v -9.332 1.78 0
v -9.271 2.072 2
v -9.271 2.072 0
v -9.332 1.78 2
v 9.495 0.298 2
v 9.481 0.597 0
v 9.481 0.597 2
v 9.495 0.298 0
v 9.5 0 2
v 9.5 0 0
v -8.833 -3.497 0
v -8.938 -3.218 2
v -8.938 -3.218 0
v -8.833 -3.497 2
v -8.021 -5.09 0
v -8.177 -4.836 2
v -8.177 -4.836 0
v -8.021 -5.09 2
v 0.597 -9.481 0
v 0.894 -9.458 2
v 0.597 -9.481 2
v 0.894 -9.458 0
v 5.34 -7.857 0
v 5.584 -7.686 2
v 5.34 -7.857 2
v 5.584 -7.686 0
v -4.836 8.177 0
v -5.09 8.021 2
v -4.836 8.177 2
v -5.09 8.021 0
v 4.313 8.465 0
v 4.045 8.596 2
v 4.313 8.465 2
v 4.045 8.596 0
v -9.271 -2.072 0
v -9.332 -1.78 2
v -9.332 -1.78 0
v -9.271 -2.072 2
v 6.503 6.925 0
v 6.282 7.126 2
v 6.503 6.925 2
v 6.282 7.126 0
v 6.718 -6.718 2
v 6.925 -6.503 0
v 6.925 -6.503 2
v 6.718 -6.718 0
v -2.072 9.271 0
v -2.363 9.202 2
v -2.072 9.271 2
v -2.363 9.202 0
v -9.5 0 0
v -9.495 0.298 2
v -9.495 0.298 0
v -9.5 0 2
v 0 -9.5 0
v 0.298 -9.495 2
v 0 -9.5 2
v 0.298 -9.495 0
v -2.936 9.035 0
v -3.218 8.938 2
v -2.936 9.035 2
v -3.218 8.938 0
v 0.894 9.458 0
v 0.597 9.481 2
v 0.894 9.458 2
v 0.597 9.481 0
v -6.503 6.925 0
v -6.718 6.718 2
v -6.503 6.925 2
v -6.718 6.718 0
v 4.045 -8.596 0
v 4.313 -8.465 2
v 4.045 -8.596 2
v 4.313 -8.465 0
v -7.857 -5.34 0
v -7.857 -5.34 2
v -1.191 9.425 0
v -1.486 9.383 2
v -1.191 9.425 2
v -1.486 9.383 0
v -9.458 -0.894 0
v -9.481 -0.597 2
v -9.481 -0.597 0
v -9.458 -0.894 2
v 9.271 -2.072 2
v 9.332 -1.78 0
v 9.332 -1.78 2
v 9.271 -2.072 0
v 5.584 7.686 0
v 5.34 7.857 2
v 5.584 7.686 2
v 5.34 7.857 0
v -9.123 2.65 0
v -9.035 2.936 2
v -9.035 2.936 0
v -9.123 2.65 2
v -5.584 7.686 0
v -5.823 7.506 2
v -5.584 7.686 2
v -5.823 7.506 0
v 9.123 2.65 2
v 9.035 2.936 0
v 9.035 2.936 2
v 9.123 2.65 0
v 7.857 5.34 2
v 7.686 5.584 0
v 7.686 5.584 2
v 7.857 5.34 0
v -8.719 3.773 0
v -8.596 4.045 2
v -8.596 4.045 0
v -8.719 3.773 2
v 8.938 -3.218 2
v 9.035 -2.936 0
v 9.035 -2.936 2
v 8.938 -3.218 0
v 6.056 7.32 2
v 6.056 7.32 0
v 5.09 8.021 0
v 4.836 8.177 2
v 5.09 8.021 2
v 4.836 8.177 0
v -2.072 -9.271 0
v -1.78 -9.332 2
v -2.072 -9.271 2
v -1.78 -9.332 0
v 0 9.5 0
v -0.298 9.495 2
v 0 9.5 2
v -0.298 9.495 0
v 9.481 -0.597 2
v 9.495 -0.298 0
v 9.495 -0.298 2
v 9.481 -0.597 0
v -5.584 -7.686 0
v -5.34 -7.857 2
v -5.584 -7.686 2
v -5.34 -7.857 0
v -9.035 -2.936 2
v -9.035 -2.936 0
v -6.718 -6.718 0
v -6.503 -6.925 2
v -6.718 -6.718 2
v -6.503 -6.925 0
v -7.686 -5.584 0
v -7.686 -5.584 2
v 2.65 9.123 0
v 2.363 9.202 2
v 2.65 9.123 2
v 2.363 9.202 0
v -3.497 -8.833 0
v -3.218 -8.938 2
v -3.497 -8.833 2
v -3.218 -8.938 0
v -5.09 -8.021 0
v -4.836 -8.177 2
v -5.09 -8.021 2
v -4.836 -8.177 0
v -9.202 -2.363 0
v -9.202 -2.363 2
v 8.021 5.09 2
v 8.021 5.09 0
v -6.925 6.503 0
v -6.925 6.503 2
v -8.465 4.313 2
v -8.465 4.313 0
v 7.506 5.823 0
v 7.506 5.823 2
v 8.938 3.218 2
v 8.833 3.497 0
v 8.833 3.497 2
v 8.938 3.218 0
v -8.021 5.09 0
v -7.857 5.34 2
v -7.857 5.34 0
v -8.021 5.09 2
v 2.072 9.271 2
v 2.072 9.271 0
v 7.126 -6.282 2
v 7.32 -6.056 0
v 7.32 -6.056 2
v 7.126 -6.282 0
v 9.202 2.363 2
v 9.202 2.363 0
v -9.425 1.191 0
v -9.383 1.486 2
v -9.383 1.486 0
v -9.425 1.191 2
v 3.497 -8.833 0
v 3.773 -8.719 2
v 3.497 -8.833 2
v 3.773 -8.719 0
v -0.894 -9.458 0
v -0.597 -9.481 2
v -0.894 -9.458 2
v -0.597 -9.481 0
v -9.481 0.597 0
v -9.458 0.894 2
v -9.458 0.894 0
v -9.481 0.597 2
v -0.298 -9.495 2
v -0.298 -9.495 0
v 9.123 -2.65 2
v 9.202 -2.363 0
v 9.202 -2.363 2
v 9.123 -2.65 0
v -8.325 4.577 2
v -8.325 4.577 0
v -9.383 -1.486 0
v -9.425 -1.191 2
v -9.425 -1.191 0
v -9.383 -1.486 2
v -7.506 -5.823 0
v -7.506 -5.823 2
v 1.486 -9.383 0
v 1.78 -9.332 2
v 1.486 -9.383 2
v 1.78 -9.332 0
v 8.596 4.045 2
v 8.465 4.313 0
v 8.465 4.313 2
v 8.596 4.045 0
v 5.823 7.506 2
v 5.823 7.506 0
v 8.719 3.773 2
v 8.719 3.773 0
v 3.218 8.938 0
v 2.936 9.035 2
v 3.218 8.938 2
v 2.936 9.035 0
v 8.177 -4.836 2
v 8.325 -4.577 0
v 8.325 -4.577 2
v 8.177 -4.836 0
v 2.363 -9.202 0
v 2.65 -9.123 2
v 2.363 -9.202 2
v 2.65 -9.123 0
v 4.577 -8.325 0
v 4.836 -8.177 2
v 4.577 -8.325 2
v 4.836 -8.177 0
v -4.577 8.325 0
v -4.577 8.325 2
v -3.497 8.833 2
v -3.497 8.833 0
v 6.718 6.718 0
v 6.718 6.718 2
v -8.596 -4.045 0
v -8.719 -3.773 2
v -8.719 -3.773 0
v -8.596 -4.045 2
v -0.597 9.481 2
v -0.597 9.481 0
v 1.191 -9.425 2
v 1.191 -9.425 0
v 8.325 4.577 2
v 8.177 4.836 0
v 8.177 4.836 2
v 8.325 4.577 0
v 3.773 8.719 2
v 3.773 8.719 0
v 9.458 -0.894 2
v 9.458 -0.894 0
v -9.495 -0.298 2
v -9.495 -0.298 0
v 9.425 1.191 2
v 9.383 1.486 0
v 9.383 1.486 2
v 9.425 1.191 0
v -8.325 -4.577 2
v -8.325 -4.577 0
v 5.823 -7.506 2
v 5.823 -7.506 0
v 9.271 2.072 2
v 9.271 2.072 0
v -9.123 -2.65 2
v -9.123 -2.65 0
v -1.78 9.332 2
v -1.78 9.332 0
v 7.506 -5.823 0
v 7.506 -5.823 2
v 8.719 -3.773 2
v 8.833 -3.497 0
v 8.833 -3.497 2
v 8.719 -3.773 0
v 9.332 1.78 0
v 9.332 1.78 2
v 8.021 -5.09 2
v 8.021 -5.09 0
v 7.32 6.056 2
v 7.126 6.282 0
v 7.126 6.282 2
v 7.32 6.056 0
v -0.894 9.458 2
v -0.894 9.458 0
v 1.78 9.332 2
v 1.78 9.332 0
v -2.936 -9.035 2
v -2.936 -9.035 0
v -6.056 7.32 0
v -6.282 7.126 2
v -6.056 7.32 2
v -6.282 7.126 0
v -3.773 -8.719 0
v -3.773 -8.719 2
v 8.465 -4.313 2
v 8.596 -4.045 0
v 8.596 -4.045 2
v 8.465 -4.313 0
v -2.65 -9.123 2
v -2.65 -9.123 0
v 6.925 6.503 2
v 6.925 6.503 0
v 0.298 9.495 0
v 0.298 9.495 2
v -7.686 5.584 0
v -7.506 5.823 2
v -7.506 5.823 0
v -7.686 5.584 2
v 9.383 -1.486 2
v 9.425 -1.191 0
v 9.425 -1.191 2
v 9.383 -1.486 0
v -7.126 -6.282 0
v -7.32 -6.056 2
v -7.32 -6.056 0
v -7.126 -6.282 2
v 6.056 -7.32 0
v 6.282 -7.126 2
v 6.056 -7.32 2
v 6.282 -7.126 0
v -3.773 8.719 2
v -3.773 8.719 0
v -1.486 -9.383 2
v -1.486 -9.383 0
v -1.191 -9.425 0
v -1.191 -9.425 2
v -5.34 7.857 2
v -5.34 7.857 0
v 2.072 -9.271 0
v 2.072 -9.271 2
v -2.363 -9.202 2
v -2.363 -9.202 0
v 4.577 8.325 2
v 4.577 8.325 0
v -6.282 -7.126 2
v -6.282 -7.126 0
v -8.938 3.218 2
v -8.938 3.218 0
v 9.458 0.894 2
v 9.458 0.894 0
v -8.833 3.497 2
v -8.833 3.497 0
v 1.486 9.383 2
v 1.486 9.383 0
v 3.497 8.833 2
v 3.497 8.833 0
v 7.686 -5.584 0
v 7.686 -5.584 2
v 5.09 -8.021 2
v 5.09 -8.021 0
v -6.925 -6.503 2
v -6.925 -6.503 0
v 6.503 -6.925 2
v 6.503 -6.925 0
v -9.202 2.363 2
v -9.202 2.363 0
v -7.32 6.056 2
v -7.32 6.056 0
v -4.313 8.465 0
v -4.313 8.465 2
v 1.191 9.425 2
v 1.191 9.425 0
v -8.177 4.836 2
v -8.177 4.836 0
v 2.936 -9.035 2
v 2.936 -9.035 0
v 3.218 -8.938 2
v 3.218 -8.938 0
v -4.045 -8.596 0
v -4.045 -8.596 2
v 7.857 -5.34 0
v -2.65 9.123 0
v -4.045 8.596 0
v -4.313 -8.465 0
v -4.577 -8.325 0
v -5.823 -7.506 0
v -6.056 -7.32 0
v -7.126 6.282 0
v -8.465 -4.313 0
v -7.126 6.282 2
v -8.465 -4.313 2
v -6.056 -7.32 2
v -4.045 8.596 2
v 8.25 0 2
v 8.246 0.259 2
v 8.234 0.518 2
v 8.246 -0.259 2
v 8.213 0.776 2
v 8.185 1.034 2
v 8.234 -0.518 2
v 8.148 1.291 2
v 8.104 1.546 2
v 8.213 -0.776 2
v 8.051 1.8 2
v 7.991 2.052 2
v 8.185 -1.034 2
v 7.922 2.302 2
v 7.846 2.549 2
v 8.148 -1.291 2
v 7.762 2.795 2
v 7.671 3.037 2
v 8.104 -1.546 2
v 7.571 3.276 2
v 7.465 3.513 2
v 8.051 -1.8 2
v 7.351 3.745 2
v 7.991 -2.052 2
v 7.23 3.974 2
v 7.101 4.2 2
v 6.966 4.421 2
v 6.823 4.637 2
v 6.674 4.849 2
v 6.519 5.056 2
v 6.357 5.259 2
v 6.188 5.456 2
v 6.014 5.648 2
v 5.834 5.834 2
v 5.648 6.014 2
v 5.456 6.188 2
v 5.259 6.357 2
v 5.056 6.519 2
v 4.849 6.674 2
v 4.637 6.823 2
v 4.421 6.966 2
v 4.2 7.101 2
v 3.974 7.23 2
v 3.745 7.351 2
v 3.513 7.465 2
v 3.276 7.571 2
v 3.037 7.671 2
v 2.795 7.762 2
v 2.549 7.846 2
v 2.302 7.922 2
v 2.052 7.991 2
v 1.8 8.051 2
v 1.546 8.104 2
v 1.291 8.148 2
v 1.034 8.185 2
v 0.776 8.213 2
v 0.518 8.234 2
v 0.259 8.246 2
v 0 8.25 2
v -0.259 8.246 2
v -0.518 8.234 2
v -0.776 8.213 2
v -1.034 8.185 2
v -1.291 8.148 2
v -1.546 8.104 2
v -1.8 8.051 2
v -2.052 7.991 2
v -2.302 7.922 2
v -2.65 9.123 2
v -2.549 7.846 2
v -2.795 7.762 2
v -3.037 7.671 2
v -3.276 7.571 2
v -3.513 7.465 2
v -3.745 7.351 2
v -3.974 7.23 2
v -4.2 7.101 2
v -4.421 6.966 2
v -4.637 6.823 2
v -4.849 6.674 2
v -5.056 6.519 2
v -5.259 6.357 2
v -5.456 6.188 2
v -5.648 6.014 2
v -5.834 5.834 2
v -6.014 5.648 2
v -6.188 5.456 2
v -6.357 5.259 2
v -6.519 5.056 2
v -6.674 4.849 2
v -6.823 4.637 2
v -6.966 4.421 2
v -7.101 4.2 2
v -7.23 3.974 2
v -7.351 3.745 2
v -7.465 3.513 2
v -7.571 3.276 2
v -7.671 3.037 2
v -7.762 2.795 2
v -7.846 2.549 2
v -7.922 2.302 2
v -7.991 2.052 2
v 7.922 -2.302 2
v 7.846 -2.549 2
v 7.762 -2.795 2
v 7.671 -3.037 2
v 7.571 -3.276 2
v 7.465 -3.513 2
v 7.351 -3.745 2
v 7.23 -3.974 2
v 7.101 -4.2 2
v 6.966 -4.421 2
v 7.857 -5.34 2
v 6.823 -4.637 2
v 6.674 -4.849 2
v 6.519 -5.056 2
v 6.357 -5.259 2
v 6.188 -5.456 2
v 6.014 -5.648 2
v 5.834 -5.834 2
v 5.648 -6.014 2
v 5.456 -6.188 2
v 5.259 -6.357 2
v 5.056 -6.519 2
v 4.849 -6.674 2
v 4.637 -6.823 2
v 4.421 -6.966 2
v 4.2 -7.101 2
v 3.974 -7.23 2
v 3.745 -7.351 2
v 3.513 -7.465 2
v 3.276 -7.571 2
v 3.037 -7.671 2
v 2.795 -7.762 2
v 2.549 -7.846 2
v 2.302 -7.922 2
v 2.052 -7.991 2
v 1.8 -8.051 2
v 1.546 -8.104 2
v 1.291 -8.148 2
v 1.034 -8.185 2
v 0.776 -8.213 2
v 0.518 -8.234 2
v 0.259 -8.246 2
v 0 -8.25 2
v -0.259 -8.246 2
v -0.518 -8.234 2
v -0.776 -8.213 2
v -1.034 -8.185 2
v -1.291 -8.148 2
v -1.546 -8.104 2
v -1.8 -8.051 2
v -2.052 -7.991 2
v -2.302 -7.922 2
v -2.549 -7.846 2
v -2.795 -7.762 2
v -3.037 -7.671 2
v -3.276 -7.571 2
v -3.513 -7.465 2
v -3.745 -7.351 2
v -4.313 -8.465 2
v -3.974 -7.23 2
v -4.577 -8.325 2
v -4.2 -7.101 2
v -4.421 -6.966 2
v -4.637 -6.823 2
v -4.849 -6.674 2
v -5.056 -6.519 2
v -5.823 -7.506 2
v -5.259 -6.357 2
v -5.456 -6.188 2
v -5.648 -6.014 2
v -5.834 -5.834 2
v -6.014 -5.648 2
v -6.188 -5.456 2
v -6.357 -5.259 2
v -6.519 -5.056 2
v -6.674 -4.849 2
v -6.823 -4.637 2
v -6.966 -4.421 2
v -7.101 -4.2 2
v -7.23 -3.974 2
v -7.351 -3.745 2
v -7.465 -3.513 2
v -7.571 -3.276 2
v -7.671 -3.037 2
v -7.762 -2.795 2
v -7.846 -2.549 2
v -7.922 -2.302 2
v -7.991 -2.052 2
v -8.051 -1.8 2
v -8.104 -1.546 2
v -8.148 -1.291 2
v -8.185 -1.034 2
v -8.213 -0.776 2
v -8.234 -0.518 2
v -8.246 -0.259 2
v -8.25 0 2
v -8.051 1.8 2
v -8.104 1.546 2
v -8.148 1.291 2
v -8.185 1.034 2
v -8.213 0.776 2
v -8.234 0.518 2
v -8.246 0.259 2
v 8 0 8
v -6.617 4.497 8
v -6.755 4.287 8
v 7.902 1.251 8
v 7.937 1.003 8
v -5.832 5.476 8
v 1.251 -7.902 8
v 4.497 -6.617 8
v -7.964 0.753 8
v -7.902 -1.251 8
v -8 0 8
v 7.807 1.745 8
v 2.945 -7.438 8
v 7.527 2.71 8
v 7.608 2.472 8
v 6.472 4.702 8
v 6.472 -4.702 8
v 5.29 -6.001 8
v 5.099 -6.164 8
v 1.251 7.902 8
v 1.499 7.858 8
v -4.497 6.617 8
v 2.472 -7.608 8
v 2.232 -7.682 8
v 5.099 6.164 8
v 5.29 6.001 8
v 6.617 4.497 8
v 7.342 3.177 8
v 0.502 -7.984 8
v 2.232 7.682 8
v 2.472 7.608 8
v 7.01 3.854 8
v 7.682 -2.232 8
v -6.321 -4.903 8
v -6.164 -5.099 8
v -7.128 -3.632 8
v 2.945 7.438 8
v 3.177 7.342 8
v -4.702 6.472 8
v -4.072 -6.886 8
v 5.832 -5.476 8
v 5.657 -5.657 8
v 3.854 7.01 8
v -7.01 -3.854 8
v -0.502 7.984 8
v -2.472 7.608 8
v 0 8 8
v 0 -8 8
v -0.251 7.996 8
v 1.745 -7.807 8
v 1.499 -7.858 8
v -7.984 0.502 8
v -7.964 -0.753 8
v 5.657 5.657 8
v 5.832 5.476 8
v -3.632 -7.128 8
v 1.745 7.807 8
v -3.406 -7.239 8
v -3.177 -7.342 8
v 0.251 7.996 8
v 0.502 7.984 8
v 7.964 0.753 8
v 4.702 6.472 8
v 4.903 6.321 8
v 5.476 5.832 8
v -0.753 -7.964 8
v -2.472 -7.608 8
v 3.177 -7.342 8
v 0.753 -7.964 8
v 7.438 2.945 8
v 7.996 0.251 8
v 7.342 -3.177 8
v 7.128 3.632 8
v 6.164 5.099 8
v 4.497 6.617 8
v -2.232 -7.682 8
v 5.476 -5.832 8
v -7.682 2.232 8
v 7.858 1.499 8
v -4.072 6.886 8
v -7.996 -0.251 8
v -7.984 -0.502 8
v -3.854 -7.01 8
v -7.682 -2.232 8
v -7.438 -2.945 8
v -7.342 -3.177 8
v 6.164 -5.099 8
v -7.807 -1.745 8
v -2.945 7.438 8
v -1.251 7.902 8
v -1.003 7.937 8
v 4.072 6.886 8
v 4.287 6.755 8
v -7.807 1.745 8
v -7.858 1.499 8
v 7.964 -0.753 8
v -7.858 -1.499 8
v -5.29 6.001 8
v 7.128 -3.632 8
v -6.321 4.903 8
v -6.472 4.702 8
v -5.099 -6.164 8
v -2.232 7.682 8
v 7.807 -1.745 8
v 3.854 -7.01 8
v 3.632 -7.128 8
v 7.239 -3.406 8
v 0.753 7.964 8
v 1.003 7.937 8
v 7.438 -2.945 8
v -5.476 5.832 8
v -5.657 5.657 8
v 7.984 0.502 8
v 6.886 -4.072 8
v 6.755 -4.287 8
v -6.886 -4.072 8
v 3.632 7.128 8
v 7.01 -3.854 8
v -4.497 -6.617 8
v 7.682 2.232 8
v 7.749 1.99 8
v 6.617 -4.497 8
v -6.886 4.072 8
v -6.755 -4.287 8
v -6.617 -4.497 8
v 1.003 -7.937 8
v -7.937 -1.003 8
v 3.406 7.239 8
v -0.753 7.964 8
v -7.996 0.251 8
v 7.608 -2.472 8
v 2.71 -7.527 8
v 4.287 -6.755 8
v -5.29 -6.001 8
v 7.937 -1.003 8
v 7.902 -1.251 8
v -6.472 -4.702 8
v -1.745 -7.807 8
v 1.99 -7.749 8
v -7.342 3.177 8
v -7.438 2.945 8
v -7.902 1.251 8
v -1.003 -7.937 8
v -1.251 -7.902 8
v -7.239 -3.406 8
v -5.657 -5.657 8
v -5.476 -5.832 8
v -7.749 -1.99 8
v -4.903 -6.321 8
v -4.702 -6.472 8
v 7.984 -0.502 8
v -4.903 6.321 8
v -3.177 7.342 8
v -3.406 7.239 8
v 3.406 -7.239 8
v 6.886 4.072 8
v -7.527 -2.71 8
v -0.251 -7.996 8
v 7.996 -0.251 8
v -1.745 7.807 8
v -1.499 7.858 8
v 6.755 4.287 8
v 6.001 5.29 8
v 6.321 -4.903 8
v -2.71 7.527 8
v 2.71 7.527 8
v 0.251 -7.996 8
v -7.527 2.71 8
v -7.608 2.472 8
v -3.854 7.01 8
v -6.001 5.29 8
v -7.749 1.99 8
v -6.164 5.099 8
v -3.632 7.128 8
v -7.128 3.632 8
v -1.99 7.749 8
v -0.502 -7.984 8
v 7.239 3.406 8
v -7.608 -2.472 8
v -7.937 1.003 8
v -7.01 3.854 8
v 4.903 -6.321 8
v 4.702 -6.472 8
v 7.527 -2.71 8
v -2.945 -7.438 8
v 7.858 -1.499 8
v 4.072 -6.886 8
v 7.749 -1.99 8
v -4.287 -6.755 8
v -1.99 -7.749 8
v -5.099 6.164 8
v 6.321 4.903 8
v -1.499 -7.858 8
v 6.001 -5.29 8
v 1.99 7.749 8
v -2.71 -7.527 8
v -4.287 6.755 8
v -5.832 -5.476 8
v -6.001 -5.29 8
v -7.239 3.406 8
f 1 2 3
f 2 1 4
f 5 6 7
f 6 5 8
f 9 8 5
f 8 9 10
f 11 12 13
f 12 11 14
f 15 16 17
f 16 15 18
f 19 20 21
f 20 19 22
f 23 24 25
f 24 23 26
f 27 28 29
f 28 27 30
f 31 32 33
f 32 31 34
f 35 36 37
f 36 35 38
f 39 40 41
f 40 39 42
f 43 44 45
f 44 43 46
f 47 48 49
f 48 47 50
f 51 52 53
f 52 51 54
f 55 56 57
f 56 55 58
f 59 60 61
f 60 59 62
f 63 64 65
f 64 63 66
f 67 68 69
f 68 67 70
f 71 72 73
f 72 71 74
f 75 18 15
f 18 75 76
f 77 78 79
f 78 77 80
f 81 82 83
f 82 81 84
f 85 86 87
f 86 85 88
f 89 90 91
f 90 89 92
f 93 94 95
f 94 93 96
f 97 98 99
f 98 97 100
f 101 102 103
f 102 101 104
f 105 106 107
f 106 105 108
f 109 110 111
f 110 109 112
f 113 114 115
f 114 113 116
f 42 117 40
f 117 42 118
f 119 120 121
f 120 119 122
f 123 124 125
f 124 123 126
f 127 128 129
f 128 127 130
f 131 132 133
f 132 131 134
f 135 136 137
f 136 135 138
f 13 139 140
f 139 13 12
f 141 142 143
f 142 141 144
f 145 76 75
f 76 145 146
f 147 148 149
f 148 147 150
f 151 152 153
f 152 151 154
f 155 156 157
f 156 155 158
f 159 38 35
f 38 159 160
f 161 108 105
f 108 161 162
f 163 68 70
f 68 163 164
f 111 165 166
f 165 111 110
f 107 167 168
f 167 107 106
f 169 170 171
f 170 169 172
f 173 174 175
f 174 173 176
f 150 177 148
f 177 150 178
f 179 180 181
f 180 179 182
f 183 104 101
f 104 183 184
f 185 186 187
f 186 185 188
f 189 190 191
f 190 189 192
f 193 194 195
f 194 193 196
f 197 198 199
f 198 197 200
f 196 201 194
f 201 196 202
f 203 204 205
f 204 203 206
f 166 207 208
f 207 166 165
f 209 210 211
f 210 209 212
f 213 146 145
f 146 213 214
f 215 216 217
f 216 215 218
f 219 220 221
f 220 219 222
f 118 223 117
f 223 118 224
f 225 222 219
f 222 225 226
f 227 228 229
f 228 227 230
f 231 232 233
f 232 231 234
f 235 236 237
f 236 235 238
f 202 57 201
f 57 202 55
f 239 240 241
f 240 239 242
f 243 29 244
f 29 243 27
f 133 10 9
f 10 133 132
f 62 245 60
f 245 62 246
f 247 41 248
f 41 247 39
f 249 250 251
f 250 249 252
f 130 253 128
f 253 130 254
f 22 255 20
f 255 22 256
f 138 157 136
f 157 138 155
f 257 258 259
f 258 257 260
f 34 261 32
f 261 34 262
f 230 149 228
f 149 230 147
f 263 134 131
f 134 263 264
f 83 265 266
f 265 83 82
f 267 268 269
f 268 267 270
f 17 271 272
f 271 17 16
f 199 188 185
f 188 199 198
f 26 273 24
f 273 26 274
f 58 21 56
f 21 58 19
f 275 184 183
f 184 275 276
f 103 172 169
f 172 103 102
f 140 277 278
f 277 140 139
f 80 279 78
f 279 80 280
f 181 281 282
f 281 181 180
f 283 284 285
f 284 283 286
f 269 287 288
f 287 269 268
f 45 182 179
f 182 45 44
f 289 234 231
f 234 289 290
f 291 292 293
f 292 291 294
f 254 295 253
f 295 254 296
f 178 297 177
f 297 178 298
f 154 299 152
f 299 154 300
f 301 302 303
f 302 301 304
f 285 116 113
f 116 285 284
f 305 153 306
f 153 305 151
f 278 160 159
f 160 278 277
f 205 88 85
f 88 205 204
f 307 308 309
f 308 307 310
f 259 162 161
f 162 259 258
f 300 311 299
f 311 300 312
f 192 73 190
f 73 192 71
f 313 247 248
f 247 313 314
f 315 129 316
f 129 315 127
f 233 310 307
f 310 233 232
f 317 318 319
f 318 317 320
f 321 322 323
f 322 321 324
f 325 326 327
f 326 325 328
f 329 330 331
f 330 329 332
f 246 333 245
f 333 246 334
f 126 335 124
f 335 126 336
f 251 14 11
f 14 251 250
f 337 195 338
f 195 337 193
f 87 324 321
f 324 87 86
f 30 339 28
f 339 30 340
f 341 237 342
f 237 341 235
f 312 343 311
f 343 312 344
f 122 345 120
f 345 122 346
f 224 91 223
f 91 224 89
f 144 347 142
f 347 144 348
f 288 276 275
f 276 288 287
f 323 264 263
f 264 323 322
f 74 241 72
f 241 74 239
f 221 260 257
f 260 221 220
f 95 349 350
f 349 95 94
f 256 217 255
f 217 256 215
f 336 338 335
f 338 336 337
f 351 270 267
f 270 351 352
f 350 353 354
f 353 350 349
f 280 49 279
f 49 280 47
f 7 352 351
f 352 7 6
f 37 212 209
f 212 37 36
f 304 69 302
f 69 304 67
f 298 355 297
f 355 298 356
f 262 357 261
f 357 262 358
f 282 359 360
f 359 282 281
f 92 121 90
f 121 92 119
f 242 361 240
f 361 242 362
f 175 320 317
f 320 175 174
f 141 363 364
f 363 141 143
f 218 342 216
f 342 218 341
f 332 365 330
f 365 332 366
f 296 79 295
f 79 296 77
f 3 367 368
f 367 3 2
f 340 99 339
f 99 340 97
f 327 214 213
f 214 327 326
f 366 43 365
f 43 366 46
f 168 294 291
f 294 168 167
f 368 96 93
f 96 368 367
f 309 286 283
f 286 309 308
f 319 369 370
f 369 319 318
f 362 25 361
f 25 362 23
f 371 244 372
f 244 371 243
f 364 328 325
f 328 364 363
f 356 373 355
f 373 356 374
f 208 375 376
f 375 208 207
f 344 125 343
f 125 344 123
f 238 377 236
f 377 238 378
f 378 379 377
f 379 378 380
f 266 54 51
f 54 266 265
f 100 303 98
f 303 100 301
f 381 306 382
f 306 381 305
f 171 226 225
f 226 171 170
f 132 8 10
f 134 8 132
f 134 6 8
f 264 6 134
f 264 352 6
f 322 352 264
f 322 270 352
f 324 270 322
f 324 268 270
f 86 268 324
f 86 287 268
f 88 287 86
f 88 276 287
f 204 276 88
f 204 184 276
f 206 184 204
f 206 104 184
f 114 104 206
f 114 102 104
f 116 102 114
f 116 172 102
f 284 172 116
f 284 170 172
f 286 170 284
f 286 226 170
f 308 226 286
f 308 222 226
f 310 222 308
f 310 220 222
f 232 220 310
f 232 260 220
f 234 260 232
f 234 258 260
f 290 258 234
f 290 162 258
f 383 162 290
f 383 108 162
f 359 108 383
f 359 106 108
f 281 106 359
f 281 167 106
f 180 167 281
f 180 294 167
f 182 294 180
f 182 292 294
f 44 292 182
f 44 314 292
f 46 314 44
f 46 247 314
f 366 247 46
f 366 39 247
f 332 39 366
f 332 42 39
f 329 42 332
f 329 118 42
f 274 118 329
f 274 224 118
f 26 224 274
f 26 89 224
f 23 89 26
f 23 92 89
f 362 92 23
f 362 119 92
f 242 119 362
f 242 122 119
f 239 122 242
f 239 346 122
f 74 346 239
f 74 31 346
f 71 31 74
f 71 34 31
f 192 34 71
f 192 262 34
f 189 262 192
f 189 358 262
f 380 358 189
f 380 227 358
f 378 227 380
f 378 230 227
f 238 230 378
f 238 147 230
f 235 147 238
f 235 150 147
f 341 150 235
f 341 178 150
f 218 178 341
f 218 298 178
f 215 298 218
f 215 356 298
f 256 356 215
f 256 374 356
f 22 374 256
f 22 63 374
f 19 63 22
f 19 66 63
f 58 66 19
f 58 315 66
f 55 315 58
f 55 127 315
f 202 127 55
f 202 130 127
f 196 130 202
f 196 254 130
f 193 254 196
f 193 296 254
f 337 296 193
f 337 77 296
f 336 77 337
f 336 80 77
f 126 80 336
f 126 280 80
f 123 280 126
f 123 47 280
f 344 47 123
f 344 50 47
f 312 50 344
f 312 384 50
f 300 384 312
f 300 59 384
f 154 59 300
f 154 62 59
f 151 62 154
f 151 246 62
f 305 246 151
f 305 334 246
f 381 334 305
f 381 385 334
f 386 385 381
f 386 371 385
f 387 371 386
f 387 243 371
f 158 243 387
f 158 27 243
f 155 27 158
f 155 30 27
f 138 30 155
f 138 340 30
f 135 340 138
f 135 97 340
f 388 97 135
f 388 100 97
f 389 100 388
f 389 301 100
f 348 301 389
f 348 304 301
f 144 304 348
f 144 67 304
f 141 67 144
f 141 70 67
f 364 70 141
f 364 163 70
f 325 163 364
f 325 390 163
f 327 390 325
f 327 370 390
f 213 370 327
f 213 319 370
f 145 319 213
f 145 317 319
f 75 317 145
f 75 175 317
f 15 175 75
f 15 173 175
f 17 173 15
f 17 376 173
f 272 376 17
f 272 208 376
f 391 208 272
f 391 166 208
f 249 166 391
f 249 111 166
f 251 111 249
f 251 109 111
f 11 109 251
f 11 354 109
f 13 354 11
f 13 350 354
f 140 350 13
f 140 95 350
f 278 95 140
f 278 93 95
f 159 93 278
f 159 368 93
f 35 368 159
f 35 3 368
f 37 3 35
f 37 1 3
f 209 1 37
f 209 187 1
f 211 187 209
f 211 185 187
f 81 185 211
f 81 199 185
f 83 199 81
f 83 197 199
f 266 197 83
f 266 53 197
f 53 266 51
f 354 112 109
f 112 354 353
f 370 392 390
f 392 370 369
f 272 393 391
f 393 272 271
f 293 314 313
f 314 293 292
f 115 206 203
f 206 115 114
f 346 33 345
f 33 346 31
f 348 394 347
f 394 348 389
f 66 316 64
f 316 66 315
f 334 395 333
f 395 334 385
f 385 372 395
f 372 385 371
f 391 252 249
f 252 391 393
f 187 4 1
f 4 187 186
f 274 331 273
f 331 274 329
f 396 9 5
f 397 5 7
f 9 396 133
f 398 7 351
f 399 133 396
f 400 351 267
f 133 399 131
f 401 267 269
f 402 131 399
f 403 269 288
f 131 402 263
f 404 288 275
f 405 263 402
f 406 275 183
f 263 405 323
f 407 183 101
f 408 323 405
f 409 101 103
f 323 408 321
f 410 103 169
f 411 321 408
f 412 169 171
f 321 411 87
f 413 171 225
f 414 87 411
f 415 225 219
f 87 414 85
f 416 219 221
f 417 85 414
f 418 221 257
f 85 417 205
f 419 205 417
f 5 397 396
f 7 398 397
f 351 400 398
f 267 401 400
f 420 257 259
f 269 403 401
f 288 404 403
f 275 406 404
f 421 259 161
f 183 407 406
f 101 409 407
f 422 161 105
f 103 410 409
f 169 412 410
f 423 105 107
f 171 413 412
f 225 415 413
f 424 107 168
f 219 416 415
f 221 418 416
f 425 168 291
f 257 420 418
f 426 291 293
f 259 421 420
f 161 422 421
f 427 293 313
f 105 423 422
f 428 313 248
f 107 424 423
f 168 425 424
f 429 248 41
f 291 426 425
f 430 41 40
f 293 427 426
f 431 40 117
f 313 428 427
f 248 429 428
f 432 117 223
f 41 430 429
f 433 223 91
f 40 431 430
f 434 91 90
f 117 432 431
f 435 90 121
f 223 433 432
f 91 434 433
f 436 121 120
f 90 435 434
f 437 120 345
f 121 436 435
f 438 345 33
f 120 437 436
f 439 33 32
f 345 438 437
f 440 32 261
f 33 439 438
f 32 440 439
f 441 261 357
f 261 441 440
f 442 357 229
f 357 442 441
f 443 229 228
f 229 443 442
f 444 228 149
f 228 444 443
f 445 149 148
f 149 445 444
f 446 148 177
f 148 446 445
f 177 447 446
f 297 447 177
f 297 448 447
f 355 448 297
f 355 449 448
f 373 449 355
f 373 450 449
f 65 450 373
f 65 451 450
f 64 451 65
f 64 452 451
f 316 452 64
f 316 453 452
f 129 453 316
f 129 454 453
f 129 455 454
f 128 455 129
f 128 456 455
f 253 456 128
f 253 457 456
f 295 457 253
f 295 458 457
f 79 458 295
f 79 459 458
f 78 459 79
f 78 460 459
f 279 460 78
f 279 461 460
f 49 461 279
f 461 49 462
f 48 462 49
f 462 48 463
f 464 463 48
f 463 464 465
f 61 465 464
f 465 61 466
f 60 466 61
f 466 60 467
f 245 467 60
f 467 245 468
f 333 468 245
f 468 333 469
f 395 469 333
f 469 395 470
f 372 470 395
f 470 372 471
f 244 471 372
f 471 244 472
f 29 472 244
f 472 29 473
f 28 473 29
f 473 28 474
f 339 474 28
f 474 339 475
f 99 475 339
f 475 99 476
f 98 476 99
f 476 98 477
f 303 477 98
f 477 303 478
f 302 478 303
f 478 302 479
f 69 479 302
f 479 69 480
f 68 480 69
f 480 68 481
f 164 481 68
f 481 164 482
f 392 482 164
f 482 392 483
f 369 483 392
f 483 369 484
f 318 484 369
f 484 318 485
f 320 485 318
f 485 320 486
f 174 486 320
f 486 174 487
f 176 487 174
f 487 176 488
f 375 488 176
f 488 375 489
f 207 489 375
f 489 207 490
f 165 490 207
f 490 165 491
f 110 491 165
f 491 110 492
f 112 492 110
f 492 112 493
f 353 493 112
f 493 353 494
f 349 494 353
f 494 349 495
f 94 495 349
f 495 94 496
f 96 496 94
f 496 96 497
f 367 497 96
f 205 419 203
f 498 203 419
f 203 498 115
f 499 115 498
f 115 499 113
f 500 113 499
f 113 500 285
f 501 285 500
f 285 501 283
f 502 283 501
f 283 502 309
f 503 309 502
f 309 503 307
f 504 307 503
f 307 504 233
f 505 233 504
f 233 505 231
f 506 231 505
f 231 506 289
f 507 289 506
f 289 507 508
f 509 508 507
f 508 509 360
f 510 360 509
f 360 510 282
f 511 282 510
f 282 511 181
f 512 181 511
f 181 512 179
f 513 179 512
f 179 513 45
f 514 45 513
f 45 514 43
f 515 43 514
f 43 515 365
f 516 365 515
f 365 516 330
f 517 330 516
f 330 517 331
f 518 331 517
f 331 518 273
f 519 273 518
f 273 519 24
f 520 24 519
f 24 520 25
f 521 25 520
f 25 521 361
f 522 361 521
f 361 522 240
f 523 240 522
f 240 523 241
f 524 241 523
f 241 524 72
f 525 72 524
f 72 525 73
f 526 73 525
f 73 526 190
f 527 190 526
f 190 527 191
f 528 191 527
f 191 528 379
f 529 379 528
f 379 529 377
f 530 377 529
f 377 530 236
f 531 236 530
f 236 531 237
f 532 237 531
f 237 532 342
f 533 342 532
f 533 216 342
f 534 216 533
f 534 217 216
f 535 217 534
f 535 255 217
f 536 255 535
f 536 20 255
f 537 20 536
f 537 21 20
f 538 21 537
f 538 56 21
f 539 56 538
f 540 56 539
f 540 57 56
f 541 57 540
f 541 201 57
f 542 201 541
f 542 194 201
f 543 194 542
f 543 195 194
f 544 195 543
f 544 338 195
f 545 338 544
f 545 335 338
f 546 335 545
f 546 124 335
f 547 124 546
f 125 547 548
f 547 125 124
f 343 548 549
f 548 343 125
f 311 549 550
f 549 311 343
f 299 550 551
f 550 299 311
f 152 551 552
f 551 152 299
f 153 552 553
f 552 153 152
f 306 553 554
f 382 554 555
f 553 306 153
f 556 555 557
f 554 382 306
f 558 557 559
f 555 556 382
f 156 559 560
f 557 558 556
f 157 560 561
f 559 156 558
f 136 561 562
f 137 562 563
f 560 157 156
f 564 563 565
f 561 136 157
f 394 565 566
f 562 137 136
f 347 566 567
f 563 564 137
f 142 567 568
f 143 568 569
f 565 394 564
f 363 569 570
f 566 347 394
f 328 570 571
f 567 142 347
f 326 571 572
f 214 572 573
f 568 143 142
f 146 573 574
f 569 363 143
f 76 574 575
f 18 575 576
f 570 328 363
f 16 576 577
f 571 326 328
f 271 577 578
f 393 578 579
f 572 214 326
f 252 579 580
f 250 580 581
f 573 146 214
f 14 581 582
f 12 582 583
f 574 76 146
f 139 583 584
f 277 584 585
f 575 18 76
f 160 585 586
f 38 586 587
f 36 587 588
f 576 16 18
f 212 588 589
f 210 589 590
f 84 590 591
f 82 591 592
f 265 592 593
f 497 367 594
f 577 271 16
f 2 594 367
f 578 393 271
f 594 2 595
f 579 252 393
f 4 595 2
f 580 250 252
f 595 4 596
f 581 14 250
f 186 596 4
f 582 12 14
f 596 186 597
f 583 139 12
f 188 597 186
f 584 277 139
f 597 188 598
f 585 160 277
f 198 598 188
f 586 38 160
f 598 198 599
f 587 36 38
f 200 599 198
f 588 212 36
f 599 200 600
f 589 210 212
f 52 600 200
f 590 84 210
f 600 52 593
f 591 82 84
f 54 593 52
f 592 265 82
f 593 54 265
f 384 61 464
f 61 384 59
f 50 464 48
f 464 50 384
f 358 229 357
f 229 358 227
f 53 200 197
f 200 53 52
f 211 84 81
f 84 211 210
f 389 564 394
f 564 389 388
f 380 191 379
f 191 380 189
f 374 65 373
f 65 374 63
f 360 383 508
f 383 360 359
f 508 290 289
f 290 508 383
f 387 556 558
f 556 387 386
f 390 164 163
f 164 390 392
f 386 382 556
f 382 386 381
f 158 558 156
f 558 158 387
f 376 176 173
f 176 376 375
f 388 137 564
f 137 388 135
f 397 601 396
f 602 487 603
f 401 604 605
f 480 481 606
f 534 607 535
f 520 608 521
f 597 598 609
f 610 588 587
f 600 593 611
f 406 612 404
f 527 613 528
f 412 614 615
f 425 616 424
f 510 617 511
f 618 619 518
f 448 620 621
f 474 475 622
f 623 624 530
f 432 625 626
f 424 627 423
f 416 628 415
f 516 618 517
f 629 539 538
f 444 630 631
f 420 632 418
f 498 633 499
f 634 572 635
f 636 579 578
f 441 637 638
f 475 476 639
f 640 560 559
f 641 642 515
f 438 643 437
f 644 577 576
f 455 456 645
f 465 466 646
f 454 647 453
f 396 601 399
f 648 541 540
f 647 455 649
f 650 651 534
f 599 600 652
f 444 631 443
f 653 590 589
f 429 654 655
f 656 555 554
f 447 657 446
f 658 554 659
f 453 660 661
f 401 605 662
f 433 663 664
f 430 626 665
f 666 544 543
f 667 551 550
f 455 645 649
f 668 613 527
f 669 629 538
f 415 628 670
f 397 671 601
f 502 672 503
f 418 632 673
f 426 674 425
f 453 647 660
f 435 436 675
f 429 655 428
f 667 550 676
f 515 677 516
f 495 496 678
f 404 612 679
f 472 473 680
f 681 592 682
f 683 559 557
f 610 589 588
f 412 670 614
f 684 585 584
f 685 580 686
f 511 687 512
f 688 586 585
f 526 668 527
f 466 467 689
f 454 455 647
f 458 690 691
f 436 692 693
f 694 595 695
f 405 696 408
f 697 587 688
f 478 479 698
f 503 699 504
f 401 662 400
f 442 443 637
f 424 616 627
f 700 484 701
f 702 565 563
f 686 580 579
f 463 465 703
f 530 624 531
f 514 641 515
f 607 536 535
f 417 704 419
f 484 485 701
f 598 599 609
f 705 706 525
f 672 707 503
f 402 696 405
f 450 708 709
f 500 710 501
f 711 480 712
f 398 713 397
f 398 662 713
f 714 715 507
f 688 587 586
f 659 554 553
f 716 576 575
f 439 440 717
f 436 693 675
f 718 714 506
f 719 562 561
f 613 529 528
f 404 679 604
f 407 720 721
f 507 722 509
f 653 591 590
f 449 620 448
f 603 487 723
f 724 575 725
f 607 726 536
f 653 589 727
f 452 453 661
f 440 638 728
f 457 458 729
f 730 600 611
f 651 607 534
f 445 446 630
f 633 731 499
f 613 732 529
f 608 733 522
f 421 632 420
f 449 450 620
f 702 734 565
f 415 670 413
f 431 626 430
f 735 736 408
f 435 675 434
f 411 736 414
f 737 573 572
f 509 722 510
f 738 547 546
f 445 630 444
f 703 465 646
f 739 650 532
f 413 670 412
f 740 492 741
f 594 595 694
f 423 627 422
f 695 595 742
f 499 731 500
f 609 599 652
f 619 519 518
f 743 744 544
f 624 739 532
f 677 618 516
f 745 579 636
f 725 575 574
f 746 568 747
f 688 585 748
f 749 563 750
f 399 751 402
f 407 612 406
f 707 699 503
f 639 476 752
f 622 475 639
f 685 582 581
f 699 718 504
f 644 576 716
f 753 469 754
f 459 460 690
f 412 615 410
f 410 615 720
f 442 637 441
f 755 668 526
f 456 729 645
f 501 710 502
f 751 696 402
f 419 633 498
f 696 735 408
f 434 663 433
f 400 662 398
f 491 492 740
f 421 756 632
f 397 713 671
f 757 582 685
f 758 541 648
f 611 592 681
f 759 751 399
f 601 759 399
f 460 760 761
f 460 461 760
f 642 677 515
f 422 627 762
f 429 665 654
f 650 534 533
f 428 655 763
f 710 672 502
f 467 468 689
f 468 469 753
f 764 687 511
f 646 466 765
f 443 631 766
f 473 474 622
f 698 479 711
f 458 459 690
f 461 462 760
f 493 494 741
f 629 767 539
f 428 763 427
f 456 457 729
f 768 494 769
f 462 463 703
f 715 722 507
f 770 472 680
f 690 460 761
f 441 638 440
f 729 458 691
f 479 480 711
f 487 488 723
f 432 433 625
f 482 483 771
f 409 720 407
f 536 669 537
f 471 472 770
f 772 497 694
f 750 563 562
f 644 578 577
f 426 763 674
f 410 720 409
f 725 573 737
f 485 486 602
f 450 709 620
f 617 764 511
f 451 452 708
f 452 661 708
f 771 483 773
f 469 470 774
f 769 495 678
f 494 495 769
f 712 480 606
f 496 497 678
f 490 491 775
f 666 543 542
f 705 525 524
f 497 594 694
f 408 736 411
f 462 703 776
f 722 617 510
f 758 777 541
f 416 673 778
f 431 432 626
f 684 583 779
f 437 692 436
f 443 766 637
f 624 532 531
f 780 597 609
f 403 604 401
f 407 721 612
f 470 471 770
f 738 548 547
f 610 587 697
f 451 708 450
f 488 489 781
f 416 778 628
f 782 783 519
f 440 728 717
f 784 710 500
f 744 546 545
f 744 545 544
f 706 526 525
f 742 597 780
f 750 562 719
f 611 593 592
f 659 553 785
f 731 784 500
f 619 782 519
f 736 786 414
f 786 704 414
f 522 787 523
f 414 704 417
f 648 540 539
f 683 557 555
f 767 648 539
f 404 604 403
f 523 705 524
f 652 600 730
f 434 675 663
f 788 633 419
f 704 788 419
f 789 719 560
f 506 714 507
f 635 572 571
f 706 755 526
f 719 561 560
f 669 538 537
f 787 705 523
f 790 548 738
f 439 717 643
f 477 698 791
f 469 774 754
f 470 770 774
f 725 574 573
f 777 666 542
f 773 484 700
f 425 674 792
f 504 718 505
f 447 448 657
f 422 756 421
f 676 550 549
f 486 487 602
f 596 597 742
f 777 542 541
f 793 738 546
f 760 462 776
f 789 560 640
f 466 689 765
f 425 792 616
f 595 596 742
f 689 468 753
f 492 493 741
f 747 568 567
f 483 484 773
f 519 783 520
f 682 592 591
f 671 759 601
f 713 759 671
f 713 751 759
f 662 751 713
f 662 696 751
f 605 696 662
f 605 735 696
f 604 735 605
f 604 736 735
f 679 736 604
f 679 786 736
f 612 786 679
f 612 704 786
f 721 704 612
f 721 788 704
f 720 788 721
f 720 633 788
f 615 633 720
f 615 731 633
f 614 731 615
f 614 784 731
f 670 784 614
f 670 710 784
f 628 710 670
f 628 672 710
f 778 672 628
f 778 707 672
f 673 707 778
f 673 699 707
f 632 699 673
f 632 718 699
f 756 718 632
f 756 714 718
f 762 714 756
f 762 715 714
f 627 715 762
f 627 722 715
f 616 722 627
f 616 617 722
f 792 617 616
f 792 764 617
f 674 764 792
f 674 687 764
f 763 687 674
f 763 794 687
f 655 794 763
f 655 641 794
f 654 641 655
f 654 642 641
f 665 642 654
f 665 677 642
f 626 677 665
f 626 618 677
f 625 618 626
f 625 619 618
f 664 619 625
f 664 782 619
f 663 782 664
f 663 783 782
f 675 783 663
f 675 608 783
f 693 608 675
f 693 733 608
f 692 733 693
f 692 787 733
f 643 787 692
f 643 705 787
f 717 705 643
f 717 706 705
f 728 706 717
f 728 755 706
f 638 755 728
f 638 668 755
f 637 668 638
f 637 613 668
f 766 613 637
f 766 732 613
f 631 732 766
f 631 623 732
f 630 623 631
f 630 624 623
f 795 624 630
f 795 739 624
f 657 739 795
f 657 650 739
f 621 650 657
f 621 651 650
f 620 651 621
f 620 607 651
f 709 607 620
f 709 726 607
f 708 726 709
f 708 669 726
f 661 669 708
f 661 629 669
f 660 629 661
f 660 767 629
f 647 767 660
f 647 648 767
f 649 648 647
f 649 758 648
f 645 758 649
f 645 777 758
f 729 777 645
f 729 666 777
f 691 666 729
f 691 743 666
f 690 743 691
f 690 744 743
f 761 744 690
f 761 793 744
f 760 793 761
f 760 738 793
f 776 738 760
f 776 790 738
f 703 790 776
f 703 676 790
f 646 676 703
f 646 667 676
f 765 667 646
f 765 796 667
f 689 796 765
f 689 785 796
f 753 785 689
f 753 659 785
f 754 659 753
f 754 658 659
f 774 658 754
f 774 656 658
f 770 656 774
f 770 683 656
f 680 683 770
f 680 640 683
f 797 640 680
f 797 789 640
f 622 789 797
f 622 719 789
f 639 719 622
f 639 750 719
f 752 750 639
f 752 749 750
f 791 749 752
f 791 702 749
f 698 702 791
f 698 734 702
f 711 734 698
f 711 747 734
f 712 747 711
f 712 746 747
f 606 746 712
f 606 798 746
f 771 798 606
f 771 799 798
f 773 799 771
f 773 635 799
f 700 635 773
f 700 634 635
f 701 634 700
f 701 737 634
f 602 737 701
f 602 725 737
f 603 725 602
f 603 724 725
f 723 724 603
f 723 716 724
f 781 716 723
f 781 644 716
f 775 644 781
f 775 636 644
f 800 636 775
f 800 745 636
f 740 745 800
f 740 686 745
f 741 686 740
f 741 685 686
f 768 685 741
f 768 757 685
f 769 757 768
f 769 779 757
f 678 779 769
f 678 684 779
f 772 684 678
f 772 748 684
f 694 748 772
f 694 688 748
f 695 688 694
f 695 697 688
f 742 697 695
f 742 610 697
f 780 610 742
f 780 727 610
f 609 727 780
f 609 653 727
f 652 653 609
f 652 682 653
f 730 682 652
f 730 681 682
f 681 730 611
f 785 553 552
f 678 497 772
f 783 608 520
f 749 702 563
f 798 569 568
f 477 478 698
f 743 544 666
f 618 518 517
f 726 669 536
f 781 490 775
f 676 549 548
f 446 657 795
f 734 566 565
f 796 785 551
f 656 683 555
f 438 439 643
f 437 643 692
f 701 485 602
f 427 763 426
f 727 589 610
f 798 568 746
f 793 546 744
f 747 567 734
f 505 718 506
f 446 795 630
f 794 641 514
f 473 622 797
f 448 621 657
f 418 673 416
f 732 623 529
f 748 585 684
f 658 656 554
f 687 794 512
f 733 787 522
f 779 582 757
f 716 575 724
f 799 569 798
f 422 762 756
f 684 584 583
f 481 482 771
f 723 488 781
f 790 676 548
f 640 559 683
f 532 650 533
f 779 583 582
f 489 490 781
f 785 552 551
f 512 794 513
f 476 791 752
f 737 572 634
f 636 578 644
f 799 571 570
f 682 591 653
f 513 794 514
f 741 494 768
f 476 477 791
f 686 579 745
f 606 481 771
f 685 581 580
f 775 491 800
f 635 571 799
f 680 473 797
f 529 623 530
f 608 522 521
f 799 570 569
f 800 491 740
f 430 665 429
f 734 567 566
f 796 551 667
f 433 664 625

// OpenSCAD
// file: ../sc.scad
// ShortCuts.scad 
// Autor: Rudolf Huttary, Berlin 2015
//
$fn = 100; 

//show_examples(); 

module show_examples()
	place_in_rect(30, 30)
	{
		Cy(h = 10); 
		CyH(h = 10); 
		CyH(h = 10, w = 30); 
		CyS(h = 10); 
		CyS(h = 10, w1 = 25, w2 = 75); 
		Cu(10); 
		Ri(h = 10); 
		RiH(h = 10); 
		RiS(h = 10, w1 = 10); 
		RiS(h = 10, w1 = 30, w2 = 300); 
		Sp(); 
		SpH(10, 30, 30); 
	}


module help()
{
echo("==============="); 
echo("help(): shows this help"); 
echo("show_examples(): shows some examples"); 
echo("place_in_rect(): places children objects in grid"); 
echo("Transformations:"); 
echo(" transform :  T(x=0, y=0, z=0), Tx(x=0) , Ty(y=0), Tz(z=0)"); 
echo(" rotate :  R(x=0, y=0, z=0), Rx(x=0) , Ry(y=0), Rz(z=0)"); 
echo(" scale :  S(x=1, y=1, z=1), Sx(x=1) , Sy(y=1), Sz(z=1)"); 
echo("Logical"); 
echo(" difference :  D()"); 
echo(" union :  U()"); 
echo(" intersection : *missing*"); 
echo("Primitives"); 
echo(" circle :  Ci(r=10)"); 
echo(" circle_half :  CiH(r=10, w=0)")
echo(" circle_segment :  CiS(r=10, w1=0, w2=90)")
echo(" square :  Sq(x=10, y=0, center=true))"); 
echo(" cylinder :  Cy(r=10, h=1, center=true)"); 
echo(" cylinder_half :  CyH(r=10, w=0)")
echo(" cylinder_segment: CyS(r=10, h=1, w1=0, w2=90,center=true)"); 
echo(" cylinder_segment: Pie(r=10, h=1, w1=0, w2=90,center=true)"); 
echo(" cube :  Cu(x=10, y=0, z=10, center=true)"); 
echo(" ring :  Ri(R=10, r=5, h=1, center=true)"); 
echo(" ring_half :  RiH(R=10, r=5, h=1, w=0 center=true)"); 
echo(" ring_segment :  RiS(R=10, r=5, h=1, w1=0, w2=90, center=true)"); 
echo(" sphere:  Sp(r=10))"); 
echo(" sphere_half:  SpH(r=10, w1 = 0, w2 = 0))"); 
echo("==============="); 
}

// Euclidean Transformations
module T(x=0, y=0, z=0){translate([x, y, z])children(); }
module Tx(x) { translate([x, 0, 0])children(); }
module Ty(y) { translate([0, y, 0])children(); }
module Tz(z) { translate([0, 0, z])children(); }

module R(x=0, y=0, z=0){rotate([x, y, z]) children();}
module Rx(x=90){rotate([x, 0, 0]) children();}
module Ry(y=90){rotate([0, y, 0]) children();}
module Rz(z=90){rotate([0, 0, z]) children();}

module M(x=0, y=0, z=0){mirror([x, y, z]) children();}
module Mx(x=1){mirror([x, 0, 0]) children();}
module My(y=1){mirror([0, y, 0]) children();}
module Mz(z=1){mirror([0, 0, z]) children();}

module S(x=1, y=1, z=1){scale([x, y, z]) children();}
module Sx(x=1){scale([x, 1, 1]) children();}
module Sy(y=1){scale([1, y, 1]) children();}
module Sz(z=1){scale([1, 1, z]) children();}

module D() difference(){children(0); children([1:$children-1]);}
module U() children([0:$children-1]);
// module I() intersection()children([0:$children-1]); // does not work for some reason


// primitives - 2D

module Sq(x =10, y = 0, center = false)
{
   if(y==0)
		square([x, x], center = center); 
	else
		square([x, y], center = center); 
}
module Ci(r = 10)
{
	circle(r = r); 
}

// derived primitives - 2d
module CiH(r = 10, w = 0)
  circle_half(r, w); 

module CiS(r = 10, w1 = 0, w2 = 90)
  circle_segment(r, w1, w2); 


// primitives - 3d
module Cy(r = 10, h = 1, center = false)
{
	cylinder(r = r, h = h, center = center); 
}
module Cu(x = 10, y = 0, z = 10, center = false)
{
  if (y==0)
	cube([x, x, x], center = center); 
  else
	cube([x, y, z], center = center); 
}

// derived primitives - 3d
module CyH(r = 10, h = 1, w = 0, center = false)
  cylinder_half(r, h, w, center); 

module CyS(r = 10, h = 1, w1 = 0, w2 = 90, center = false)
  cylinder_segment(r, h, w1, w2, center); 

module Ri(R = 10, r = 5, h = 1, center = false)
  ring(R, r, h, center); 

module RiS(R = 10, r = 5, h = 1, w1 = 0, w2 = 90, center = false)
   ring_segment(R, r, h, w1, w2, center); 

module RiH(r1 = 10, r2, h = 1, w = 0, center = false)
   ring_half(r1, r2, h, w, center); 
module Pie(r = 10, h = 1, w1 = 0, w2 = 90, center = false)
  cylinder_segment(r, h, w1, w2, center);  
module Sp(r = 10)
  sphere(r); 
module SpH(r = 10, w1 = 0, w2 = 0)
  sphere_half(r, w1, w2); 
module SpS(r = 10, w1 = 0, w2 = 90, w3 = 90)
  sphere_segment(r, w1, w2); 




// clear text definitions
module circle_half(r = 10, w = 0)
{
	difference()
	{
		circle(r); 
     rotate([0, 0, w-90])
     translate([0, -r])
		square([r, 2*r], center = false); 
	}
}

module circle_segment(r = 10, w1 = 0, w2 = 90)
{
  W2 = (w1>w2)?w2+360:w2; 
  if (W2-w1 < 180)
    intersection()
		{
       circle_half(r, w1); 
       circle_half(r, W2-180); 
 		}
	else
    union()
		{
       circle_half(r, w1); 
       circle_half(r, W2-180); 
 		}
}

module cylinder_half(r = 10, h = 1, w = 0, center = true)
{
  linear_extrude(height = h, center = center)
  circle_half(r, w); 
} 

module cylinder_segment(r = 10, h = 1, w1 = 0, w2 = 90, center = true)
{
  linear_extrude(height = h, center = center)
  circle_segment(r, w1, w2); 
} 

module ring(R = 10, r = 5, h = 1, center = true)
{
	difference()
	{
	cylinder(r = R, h = h, center = center); 
   translate([0, 0, -2*h])
	cylinder(r = r, h = 4*h, center = false); 
	}
}

module ring_half(R = 10, r = 5, h = 1, w = 0, center = true)
{
	difference()
	{
		ring(R, r, h, center); 
     rotate([0, 0, w])
     translate([0, -R/2, 0])
		cube([2*R, R, 3*h], center = true); 
	}
}

module ring_segment(R = 10, r = 5, h = 1, w1 = 0, w2 = 90, center = true)
{
  W2 = (w1>w2)?w2+360:w2; 
  if (W2-w1 < 180)
    intersection()
		{
       ring_half(R, r, h, w1, center); 
       ring_half(R, r, h, W2-180, center); 
 		}
	else
    union()
		{
       ring_half(R, r, h, w1, center); 
       ring_half(R, r, h, W2-180, center); 
 		}
}


module sphere_half(r = 10, w1 = 0, w2 = 0)
{  
	difference()
	{
   	sphere(r); 
      rotate([-w1, -w2, 0])
     	translate([0, 0, r])
		cube([2*r, 2*r, r], center = true); 
	}

}


// additional code
module place_in_rect(dx =20, dy=20)
{
  cols = ceil(sqrt($children)); 
  rows = floor(sqrt($children)); 
  for(i = [0:$children-1])
	{ 
	  T(dx*(-cols/2+(i%cols)+.5), dy*(rows/2-floor(i/cols)-.5))
		 children(i); 
	}
}
// main file
use <../lib.scad>
$fn=200;


do=19;
di=16.5;
t=2;
h=6;



difference(){
    union(){
        cylinder(d=do, h=t);
        
        translate([0,0,t])
        cylinder(d1=di, d2=di-0.5, h=h);
    }



}
